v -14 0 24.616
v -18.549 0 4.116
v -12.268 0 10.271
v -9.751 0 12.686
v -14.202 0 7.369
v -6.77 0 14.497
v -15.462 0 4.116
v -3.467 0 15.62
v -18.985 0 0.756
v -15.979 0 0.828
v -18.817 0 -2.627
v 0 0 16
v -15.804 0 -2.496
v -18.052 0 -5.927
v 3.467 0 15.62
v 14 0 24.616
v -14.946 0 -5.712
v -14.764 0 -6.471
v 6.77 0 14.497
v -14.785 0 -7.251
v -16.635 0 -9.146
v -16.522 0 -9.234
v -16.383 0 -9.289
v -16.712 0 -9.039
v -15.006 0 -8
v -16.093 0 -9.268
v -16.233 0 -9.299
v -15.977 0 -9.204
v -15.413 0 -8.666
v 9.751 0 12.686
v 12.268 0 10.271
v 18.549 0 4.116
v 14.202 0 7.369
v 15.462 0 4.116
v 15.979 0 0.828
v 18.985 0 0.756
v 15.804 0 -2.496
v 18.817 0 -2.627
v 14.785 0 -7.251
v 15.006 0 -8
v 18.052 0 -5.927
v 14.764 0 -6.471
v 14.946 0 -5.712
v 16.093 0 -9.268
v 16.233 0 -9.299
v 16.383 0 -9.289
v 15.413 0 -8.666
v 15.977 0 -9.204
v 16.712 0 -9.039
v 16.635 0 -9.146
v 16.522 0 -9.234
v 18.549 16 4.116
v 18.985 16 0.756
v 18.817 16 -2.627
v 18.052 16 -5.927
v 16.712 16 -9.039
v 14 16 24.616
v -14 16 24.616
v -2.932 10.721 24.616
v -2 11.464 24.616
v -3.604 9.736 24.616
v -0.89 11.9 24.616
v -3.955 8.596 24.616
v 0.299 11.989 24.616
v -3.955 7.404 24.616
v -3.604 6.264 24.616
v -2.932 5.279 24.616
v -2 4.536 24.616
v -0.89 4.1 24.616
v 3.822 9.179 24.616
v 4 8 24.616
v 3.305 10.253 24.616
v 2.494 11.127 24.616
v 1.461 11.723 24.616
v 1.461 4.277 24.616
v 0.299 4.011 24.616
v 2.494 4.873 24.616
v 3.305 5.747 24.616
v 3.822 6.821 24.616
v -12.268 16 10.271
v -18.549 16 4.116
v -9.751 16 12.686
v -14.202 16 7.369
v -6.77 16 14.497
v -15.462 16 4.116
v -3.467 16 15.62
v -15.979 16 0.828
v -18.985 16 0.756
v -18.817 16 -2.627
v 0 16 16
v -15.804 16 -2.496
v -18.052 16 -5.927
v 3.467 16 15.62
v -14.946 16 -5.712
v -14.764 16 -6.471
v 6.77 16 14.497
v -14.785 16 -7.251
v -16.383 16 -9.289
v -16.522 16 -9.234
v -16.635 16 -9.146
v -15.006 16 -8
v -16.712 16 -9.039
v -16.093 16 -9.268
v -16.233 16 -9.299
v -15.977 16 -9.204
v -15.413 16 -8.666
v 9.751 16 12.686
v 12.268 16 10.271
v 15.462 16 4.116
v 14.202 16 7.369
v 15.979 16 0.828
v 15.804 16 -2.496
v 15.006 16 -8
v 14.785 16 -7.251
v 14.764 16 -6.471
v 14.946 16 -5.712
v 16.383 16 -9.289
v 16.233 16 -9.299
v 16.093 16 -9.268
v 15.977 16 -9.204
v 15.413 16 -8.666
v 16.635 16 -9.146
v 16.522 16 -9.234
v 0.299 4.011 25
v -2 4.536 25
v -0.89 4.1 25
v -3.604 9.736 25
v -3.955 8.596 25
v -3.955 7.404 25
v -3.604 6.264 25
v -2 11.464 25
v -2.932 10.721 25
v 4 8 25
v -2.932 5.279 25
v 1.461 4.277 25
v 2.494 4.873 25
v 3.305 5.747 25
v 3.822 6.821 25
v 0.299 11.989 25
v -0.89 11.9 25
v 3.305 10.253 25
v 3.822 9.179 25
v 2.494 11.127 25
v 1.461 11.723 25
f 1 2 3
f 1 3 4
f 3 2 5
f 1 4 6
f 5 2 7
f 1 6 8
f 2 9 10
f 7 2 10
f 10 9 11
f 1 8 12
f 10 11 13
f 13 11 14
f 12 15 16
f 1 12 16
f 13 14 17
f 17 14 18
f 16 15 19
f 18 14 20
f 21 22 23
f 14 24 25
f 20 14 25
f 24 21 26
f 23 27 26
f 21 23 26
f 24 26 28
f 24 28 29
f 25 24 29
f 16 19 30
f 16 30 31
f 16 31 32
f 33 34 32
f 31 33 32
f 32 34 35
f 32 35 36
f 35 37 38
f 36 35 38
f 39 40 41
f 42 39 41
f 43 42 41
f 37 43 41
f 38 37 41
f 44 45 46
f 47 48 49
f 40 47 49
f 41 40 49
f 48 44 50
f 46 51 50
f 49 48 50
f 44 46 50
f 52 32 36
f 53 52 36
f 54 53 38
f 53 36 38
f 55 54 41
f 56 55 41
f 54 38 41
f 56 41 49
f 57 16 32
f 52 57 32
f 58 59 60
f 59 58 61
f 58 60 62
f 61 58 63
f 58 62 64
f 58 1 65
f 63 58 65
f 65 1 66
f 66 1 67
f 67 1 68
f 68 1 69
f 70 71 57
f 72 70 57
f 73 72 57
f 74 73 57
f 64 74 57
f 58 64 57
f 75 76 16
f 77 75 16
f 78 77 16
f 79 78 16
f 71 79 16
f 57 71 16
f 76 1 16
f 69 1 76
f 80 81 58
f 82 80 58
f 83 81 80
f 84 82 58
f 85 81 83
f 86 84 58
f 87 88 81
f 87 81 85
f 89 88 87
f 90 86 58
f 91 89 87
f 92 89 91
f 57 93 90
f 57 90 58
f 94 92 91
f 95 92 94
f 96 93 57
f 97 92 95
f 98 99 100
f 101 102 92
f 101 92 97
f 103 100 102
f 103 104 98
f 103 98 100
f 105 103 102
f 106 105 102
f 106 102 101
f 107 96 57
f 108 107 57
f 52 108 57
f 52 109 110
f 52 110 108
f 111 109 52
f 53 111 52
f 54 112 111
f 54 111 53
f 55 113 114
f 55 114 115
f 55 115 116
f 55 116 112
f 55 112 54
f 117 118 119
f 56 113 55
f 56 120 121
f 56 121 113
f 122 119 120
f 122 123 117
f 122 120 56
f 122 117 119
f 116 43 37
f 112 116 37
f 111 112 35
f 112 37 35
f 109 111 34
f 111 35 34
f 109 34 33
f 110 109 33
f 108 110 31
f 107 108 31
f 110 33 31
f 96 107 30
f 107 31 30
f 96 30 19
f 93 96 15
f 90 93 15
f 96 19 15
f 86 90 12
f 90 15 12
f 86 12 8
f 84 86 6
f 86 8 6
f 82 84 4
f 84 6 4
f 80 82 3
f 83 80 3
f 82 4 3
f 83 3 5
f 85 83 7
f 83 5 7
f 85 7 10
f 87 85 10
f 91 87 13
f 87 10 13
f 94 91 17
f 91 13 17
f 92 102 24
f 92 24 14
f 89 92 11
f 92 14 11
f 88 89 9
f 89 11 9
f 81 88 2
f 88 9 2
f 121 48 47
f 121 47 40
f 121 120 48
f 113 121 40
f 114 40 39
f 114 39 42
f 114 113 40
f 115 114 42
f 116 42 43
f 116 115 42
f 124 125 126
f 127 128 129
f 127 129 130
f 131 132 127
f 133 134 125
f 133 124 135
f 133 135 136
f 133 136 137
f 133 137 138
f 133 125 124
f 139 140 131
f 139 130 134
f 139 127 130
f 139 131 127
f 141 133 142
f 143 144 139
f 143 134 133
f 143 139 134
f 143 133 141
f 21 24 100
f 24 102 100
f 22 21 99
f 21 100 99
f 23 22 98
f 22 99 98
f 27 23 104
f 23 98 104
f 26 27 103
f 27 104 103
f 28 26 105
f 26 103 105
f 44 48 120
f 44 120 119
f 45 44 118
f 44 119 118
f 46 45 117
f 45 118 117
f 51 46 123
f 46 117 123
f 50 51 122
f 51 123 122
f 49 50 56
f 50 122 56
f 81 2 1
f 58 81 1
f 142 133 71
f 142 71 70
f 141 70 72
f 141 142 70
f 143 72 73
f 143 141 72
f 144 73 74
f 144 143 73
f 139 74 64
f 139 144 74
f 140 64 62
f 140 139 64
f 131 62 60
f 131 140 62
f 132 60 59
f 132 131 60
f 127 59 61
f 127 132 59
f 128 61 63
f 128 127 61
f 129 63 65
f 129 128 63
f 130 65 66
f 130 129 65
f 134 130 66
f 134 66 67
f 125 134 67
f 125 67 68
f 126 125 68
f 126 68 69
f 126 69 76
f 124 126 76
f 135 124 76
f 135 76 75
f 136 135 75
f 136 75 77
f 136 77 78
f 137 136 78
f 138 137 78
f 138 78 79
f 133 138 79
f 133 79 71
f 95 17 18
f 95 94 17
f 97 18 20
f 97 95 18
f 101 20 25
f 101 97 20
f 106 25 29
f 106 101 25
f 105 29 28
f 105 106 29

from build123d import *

# Parameters (mm, degrees)
EXTRUIR1_DEPTH      = 16
EXTRUIR2_REACH      = 58.273
EXTRUIR2_END_RADIUS = 19
EXTRUIR2_START      = 25
CROQUIS2_R          = 4
REDONDEO1_R         = 3
REDONDEO2_R         = 0.5
EXTRUIR3_START      = -16
EXTRUIR3_DEPTH      = 16


with BuildPart() as part:
    # Croquis1 → Extruir1 (new body)
    with BuildSketch(Plane(origin=(0, 0, 0), x_dir=(1, 0, 0), z_dir=(0, 1, 0))):
        with BuildLine():
            Line((16.454482672, 9.5), (13.856406461, 8))
            ThreePointArc((13.856406461, 8), (0, -16), (-13.856406461, 8))
            Line((-13.856406461, 8), (-16.454482672, 9.5))
            ThreePointArc((-16.454482672, 9.5), (0, -19), (16.454482672, 9.5))
        make_face()
    extrude(amount=EXTRUIR1_DEPTH)

    # Extruir2: up to this cylinder (the profile starts outside it)
    extruir2_end = Plane(origin=(0, 8, 0), z_dir=(0, -1, 0)) * Cylinder(EXTRUIR2_END_RADIUS, 155.546, mode=Mode.PRIVATE)
    # Croquis2 → Extruir2 (add, up to the surface)
    with BuildSketch(Plane.XY.offset(EXTRUIR2_START), mode=Mode.PRIVATE) as extruir2_sk1:
        with Locations((0, 8)):
            Circle(CROQUIS2_R)
    extruir2_tool1 = extrude(extruir2_sk1.sketch, amount=-EXTRUIR2_REACH, mode=Mode.PRIVATE) - extruir2_end
    add(extruir2_tool1.solids().sort_by_distance((0, 8, 25))[0])

    # Redondeo1
    redondeo1_edges = [part.edges().sort_by_distance(p)[0] for p in [
        (13.856406461, 8, -8),
        (-13.856406461, 8, -8),
    ]]
    fillet(redondeo1_edges, radius=REDONDEO1_R)

    # Redondeo2
    redondeo2_edges = [part.edges().sort_by_distance(p)[0] for p in [
        (16.454482672, 8, -9.5),
        (-16.454482672, 8, -9.5),
    ]]
    fillet(redondeo2_edges, radius=REDONDEO2_R)

    # Croquis3 → Extruir3 (add)
    with BuildSketch(Plane(origin=(0, 16, 0), x_dir=(1, 0, 0), z_dir=(0, 1, 0)).offset(EXTRUIR3_START)):
        with BuildLine():
            Line((-18.548840002, -4.115888068), (-14, -24.615888068))
            Line((-14, -24.615888068), (14, -24.615888068))
            Line((14, -24.615888068), (18.548840002, -4.115888068))
            Line((18.548840002, -4.115888068), (15.461547963, -4.115888068))
            ThreePointArc((15.461547963, -4.115888068), (0, -16), (-15.461547963, -4.115888068))
            Line((-15.461547963, -4.115888068), (-18.548840002, -4.115888068))
        make_face()
    extrude(amount=EXTRUIR3_DEPTH)


solid = part.part
